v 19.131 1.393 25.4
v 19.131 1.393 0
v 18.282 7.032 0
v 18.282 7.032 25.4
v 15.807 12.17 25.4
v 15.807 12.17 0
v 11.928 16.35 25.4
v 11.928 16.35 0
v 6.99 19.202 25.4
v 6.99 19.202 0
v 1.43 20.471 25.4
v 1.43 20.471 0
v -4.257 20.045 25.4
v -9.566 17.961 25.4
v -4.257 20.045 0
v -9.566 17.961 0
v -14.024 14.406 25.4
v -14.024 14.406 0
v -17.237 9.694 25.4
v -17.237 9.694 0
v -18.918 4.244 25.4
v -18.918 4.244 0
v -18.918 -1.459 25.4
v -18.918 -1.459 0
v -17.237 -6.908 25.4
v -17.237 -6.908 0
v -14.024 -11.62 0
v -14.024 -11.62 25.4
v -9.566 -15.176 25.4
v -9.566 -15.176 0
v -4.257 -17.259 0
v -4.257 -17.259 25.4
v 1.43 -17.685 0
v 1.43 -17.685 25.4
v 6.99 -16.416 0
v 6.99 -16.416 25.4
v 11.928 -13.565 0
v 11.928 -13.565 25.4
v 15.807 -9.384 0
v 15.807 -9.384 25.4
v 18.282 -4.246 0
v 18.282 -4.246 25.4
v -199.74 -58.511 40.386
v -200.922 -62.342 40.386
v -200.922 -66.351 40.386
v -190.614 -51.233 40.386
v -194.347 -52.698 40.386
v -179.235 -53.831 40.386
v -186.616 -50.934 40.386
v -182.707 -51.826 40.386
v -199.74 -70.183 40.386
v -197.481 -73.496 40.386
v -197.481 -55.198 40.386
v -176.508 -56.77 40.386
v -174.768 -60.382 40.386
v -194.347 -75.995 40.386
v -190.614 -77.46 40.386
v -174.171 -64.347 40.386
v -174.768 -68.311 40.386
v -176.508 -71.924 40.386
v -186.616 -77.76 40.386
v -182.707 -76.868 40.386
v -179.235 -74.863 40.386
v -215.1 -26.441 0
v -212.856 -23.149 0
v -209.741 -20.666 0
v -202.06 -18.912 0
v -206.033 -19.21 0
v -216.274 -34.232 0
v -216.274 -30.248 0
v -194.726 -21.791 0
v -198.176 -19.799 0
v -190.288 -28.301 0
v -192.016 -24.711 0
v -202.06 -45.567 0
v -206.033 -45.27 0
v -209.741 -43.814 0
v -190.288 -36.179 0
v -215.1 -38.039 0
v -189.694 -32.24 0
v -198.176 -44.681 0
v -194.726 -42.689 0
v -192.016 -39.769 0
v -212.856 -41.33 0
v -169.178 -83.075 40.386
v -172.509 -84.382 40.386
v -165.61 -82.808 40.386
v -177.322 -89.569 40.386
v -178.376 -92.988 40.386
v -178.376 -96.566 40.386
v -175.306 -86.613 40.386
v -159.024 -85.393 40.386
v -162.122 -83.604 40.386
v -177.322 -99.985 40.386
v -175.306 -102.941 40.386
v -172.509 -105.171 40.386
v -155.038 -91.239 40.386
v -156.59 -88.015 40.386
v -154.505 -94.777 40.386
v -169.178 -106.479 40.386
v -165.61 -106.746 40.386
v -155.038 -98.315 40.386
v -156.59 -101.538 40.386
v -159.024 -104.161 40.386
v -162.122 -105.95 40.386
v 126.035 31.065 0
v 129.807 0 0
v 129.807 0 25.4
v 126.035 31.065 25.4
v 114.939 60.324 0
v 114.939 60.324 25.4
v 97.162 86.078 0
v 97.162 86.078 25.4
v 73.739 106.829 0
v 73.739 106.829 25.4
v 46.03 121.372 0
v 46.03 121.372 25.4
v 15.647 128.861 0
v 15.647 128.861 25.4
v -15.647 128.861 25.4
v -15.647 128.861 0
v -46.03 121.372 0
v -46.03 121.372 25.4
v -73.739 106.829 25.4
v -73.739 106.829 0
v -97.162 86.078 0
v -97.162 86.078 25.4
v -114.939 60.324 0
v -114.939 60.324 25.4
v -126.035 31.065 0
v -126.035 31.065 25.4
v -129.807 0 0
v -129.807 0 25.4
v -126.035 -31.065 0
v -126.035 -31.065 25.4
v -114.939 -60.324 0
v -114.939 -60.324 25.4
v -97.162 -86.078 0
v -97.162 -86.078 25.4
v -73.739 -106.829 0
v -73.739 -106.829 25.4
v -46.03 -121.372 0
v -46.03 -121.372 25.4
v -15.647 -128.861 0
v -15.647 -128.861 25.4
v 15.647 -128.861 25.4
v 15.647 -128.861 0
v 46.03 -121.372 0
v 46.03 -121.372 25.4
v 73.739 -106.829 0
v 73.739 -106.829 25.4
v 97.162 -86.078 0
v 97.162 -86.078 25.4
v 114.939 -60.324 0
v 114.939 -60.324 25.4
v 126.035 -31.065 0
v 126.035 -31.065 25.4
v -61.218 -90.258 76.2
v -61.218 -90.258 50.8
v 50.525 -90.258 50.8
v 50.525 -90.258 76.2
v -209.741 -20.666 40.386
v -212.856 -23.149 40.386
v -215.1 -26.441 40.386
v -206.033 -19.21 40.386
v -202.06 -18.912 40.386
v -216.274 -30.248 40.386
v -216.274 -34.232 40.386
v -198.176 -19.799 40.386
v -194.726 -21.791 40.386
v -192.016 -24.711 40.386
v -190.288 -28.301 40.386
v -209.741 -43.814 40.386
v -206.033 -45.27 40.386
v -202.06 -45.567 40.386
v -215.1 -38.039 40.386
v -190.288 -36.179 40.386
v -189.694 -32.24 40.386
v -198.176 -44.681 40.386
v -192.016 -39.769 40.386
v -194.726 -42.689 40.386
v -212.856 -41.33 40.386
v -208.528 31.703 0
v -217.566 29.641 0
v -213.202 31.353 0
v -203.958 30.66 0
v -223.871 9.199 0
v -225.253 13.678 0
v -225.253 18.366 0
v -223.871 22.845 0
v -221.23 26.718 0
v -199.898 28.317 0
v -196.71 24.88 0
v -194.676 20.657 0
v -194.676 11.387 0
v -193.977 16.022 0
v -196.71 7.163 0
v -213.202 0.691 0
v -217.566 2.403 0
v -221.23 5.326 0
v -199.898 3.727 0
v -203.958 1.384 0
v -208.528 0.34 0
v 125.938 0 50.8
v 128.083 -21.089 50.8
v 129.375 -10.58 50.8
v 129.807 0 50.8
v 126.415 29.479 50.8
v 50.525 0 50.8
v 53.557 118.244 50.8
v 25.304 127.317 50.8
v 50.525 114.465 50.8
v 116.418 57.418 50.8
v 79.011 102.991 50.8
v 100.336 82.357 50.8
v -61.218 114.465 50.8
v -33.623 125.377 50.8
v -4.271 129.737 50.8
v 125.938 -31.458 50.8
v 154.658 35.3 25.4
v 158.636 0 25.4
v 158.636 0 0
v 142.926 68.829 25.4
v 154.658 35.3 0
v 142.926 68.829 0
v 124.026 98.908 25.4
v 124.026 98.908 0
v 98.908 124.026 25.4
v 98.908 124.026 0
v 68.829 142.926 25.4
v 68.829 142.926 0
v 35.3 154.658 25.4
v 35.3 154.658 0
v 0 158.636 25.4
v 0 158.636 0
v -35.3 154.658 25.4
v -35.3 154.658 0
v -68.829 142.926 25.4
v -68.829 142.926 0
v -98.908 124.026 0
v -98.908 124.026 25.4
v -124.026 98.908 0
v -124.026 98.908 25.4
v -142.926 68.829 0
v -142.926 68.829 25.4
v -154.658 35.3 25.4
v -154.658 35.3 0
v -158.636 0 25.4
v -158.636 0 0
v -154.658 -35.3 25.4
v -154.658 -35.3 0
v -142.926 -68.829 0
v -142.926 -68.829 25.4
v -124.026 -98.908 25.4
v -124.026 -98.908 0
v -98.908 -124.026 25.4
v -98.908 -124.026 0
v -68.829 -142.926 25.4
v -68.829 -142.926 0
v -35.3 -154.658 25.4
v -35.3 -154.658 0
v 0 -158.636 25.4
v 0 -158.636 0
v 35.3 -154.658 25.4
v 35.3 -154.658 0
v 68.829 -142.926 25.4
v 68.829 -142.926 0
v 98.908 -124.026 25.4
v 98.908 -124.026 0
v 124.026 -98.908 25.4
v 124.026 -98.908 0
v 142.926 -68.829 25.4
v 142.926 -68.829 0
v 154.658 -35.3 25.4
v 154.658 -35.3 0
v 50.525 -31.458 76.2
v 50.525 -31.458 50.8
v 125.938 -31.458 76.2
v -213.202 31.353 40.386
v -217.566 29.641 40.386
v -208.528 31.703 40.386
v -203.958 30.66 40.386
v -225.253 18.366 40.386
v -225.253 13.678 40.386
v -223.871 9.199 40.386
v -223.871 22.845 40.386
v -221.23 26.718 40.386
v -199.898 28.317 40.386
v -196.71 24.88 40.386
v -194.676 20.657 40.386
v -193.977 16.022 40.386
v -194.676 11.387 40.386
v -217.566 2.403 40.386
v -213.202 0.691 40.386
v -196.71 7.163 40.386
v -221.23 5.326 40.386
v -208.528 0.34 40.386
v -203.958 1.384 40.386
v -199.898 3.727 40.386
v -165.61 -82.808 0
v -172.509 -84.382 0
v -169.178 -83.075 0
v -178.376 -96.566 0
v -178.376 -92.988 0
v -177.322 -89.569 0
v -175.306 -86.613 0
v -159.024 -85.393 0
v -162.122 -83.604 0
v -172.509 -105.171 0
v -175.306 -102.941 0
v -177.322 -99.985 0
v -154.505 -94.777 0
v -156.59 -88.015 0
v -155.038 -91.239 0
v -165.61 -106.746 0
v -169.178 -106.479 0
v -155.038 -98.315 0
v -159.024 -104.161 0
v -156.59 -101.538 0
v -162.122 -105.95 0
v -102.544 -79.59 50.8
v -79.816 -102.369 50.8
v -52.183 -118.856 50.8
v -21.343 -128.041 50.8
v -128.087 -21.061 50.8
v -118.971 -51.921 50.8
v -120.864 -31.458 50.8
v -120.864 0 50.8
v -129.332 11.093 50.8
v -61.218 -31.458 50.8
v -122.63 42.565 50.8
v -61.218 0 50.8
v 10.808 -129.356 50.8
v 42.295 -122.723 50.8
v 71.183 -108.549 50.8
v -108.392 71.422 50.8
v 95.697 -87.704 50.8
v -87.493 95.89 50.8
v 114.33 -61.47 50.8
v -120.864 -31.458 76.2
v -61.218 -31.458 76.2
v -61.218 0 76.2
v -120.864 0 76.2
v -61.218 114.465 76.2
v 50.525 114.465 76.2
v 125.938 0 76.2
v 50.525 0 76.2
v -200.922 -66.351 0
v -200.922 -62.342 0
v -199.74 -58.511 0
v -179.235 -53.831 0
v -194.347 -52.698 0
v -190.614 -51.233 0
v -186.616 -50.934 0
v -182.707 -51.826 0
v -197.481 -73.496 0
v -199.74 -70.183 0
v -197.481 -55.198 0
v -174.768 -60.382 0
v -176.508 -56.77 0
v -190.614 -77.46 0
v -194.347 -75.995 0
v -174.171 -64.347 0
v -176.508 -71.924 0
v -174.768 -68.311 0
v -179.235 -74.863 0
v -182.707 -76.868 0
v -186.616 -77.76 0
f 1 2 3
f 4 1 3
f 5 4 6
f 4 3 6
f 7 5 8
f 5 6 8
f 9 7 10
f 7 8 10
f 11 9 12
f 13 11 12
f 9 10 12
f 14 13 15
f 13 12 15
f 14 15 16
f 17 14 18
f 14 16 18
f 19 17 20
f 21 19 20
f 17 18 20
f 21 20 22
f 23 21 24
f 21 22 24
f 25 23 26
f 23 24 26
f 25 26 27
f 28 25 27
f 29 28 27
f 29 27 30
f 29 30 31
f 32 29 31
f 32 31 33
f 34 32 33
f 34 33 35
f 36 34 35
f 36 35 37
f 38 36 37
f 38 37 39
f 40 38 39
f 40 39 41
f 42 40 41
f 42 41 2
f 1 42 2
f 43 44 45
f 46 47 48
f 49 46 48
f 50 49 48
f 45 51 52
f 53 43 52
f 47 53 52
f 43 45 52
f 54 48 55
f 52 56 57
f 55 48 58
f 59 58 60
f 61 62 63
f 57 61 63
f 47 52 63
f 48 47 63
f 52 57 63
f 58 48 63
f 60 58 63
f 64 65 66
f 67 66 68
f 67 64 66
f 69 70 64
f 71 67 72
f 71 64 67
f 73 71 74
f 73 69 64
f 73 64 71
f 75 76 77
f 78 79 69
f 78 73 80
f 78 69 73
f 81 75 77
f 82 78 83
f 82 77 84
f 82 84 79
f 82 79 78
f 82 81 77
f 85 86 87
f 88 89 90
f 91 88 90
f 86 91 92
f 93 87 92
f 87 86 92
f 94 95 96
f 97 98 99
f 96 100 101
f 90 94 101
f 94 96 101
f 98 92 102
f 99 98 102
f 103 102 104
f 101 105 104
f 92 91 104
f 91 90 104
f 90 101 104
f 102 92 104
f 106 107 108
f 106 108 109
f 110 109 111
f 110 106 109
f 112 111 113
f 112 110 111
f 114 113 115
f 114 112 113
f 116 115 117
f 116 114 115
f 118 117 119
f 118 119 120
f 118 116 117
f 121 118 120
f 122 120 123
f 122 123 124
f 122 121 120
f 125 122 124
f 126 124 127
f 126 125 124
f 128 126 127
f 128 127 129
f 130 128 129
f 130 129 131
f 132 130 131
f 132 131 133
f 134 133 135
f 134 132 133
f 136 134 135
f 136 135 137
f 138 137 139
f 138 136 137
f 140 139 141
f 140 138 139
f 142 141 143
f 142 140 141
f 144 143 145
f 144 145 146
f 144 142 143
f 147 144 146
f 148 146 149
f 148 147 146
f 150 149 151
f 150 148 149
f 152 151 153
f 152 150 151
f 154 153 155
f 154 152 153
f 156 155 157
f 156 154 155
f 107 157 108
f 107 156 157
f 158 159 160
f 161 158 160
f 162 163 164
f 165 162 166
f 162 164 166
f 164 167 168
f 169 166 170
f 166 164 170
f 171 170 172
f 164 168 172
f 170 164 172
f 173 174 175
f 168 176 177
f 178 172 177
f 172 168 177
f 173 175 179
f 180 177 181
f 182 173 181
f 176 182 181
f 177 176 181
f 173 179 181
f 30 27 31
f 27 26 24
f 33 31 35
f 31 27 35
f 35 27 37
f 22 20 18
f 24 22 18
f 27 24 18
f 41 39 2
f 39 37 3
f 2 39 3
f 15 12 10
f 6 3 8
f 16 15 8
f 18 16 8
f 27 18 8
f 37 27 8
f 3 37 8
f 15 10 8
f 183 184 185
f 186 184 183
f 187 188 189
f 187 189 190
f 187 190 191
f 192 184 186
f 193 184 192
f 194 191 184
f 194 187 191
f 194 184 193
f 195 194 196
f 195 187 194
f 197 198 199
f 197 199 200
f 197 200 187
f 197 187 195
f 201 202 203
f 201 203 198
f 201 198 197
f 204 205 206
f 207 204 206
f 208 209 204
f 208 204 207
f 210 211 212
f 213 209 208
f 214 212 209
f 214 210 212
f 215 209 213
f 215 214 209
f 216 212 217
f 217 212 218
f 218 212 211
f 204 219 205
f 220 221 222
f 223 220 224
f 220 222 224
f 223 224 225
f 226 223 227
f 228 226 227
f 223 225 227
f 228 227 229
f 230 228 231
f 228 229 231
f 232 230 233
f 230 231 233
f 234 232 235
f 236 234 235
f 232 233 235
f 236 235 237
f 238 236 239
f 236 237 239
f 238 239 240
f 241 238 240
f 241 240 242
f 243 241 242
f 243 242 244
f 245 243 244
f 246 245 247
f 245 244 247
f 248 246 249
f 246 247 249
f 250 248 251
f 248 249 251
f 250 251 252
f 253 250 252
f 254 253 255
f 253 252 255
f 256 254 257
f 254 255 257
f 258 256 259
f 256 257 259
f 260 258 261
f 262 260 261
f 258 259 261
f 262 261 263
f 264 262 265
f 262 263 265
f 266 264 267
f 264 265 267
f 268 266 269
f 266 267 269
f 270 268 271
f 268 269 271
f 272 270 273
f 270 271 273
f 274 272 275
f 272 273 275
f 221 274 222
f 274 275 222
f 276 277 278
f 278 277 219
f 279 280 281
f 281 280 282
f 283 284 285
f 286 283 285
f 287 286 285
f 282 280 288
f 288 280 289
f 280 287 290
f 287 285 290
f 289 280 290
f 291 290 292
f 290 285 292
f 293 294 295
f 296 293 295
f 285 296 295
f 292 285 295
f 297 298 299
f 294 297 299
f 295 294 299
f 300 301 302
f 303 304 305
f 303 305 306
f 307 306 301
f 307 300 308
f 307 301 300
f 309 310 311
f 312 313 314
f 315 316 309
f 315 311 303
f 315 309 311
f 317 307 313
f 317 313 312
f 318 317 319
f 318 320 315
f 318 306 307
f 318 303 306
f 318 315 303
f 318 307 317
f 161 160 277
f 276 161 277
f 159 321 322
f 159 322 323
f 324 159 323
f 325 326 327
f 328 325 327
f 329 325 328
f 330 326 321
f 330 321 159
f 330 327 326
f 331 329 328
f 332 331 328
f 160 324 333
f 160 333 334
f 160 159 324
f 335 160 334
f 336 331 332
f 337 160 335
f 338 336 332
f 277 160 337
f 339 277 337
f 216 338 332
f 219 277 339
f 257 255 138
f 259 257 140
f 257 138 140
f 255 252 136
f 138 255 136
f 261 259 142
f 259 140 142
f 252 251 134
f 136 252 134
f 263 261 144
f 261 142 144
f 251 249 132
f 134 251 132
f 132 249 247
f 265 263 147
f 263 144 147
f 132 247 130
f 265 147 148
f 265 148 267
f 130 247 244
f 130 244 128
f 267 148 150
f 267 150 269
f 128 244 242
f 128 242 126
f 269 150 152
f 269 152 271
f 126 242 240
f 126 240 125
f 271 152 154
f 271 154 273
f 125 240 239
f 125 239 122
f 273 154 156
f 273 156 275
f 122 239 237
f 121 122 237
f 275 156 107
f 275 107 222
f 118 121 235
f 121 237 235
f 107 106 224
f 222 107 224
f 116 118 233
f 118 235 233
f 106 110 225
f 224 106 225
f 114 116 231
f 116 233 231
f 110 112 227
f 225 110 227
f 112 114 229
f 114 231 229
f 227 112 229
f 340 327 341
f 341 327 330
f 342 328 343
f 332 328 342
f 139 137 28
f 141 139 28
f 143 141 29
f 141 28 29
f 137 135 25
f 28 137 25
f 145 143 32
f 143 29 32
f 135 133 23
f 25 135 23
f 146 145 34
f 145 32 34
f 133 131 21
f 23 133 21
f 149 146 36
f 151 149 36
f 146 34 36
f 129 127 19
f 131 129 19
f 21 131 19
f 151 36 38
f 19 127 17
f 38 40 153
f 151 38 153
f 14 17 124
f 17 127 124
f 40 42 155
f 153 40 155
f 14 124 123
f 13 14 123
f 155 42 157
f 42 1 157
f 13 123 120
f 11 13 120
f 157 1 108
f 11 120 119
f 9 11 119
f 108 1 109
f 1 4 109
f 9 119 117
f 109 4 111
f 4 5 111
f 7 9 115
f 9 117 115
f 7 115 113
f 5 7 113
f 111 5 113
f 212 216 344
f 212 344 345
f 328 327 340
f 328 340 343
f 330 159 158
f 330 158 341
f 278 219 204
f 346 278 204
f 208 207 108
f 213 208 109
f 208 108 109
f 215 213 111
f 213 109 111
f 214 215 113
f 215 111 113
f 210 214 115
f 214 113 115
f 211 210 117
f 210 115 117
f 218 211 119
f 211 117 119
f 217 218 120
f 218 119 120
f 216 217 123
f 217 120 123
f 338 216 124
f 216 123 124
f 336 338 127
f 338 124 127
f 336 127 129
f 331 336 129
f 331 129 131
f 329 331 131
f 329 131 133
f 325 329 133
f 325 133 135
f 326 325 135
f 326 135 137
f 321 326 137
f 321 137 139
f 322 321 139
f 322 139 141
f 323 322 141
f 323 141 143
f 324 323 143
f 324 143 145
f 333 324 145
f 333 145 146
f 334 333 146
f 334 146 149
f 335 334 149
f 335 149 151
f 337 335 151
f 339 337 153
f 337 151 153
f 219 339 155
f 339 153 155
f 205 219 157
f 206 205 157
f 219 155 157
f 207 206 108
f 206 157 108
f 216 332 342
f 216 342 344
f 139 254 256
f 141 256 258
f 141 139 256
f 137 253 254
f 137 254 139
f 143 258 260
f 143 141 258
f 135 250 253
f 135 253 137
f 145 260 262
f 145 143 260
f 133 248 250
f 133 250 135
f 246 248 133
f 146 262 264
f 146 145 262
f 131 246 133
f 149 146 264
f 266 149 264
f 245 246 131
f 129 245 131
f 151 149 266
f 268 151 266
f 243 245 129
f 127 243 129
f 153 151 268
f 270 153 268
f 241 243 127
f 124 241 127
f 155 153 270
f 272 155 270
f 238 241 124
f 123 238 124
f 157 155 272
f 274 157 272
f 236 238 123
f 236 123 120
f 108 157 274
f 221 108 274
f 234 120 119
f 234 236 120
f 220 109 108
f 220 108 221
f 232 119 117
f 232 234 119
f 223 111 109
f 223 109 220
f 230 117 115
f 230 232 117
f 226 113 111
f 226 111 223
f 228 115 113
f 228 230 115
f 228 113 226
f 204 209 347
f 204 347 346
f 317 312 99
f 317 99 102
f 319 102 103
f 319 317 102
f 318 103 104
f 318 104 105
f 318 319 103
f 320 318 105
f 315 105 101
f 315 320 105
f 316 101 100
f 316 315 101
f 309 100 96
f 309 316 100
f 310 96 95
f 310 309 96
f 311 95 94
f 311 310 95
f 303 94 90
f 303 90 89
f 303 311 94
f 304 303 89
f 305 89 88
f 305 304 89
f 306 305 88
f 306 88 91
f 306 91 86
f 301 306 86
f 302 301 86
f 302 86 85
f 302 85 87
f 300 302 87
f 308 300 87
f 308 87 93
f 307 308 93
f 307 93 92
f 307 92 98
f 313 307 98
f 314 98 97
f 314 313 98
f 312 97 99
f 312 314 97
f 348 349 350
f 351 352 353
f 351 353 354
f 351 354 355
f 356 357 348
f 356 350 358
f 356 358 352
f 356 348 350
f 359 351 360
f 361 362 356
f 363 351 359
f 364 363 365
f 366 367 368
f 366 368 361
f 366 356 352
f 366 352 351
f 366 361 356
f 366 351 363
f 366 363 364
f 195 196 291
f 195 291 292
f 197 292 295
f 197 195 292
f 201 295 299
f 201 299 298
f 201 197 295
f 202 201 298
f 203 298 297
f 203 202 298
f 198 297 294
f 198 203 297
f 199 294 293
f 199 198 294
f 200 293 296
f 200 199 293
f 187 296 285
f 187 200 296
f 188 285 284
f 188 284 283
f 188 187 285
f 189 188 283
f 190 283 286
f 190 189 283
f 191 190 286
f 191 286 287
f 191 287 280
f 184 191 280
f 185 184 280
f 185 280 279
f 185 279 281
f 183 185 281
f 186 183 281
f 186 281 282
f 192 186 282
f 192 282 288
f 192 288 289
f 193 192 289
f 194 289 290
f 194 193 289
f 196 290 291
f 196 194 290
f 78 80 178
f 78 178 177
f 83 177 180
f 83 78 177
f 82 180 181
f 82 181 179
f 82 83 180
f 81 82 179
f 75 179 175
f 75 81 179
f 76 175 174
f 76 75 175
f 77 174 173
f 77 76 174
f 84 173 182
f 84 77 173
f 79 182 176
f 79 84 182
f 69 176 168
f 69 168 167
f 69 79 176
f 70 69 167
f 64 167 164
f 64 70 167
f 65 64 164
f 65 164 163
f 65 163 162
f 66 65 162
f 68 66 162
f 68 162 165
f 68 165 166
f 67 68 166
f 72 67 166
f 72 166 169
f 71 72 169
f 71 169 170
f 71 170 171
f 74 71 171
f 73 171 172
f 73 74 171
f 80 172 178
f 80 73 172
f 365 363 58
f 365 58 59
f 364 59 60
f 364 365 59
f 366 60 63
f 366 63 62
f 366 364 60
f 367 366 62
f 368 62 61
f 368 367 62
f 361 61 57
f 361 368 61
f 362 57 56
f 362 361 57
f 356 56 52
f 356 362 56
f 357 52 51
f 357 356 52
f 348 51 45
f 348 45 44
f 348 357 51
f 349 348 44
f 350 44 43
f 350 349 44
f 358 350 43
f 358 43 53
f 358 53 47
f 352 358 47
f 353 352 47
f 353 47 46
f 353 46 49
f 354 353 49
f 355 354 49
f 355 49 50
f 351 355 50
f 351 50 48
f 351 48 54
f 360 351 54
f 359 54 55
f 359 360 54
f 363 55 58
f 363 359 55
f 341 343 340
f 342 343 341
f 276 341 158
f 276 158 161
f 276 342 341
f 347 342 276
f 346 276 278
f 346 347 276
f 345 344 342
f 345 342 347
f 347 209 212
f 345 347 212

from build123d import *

# Parameters (mm, degrees)
F0_R     = 158.6355563787
F0_R_2   = 129.8072251159
F1_DEPTH = 25.4
F0_R_3   = 19.131486476
F3_R     = 15.7254746823
F4_DEPTH = 40.386
F3_R_2   = 13.3649222473
F3_R_3   = 13.4506528885
F3_R_4   = 12.002730361
F5_W     = 94.1363926977
F5_H     = 13.7223405764
F5_W_2   = 24.9571446329
F5_H_2   = 65.5404450372
F5_W_3   = 19.3717125803
F5_H_3   = 56.289691478
F2_R     = 129.8072251159
F6_DEPTH = 25.4
F7_W     = 59.6462831741
F7_H     = 31.4583579175
F7_W_2   = 111.743490314
F7_H_2   = 114.4651549493
F7_W_3   = 75.4121465458
F7_H_3   = 58.7993165381
F8_DEPTH = 25.4


with BuildPart() as f1:
    # F0 (on Top) → F1 (new body)
    with BuildSketch(Plane.XY):
        Circle(F0_R)
        Circle(F0_R_2, mode=Mode.SUBTRACT)
    extrude(amount=F1_DEPTH)



with BuildPart() as f1b:
    # F0 (on Top) → F1, piece 2 (new body)
    with BuildSketch(Plane.XY):
        with Locations((0, 1.392852515)):
            Circle(F0_R_3)
    extrude(amount=F1_DEPTH)


with BuildPart() as f4:
    # F3 (on face) → F4 (new body)
    with BuildSketch(Plane(origin=(0, 0, 0), x_dir=(1, 0, 0), z_dir=(0, 0, -1))):
        with Locations((-209.7028940916, -16.021952033)):
            Circle(F3_R)
    extrude(amount=-F4_DEPTH)


with BuildPart() as f4b:
    # F3 (on face) → F4, piece 2 (new body)
    with BuildSketch(Plane(origin=(0, 0, 0), x_dir=(1, 0, 0), z_dir=(0, 0, -1))):
        with Locations((-203.0587345362, 32.2399027646)):
            Circle(F3_R_2)
    extrude(amount=-F4_DEPTH)


with BuildPart() as f4c:
    # F3 (on face) → F4, piece 3 (new body)
    with BuildSketch(Plane(origin=(0, 0, 0), x_dir=(1, 0, 0), z_dir=(0, 0, -1))):
        with Locations((-187.6213252544, 64.3467605114)):
            Circle(F3_R_3)
    extrude(amount=-F4_DEPTH)


with BuildPart() as f4d:
    # F3 (on face) → F4, piece 4 (new body)
    with BuildSketch(Plane(origin=(0, 0, 0), x_dir=(1, 0, 0), z_dir=(0, 0, -1))):
        with Locations((-166.507422924, 94.7768241167)):
            Circle(F3_R_4)
    extrude(amount=-F4_DEPTH)


with BuildPart() as f1_1:
    add(f1.part)

    add(f1b.part)  # F6 merges F1b
    # F5 (on face) + F2 (on face) → F6 (join)
    with BuildSketch(Plane.XY.offset(25.4)):
        with Locations((72.0253409818, -6.8611702882)):
            Rectangle(F5_W, F5_H)
        with Locations((12.4785723165, -46.4925630949)):
            Rectangle(F5_W_2, F5_H_2)
        with Locations((-9.6858562902, 46.871772036)):
            Rectangle(F5_W_3, F5_H_3)
    with BuildSketch(Plane.XY.offset(25.4)):
        Circle(F2_R)
    extrude(amount=F6_DEPTH)

    # F7 (on face) → F8 (join)
    with BuildSketch(Plane.XY.offset(50.8)):
        with Locations((-91.0411454317, -15.7291789588)):
            Rectangle(F7_W, F7_H)
        with Locations((-5.3462586877, 57.2325774747)):
            Rectangle(F7_W_2, F7_H_2)
        with Locations((-5.3462586877, -15.7291789588)):
            Rectangle(F7_W_2, F7_H)
        with Locations((88.2315597422, -15.7291789588)):
            Rectangle(F7_W_3, F7_H)
        with Locations((-5.3462586877, -60.8580161866)):
            Rectangle(F7_W_2, F7_H_3)
    extrude(amount=F8_DEPTH)


solid = Compound([f4.part, f4b.part, f4c.part, f4d.part, f1_1.part])
